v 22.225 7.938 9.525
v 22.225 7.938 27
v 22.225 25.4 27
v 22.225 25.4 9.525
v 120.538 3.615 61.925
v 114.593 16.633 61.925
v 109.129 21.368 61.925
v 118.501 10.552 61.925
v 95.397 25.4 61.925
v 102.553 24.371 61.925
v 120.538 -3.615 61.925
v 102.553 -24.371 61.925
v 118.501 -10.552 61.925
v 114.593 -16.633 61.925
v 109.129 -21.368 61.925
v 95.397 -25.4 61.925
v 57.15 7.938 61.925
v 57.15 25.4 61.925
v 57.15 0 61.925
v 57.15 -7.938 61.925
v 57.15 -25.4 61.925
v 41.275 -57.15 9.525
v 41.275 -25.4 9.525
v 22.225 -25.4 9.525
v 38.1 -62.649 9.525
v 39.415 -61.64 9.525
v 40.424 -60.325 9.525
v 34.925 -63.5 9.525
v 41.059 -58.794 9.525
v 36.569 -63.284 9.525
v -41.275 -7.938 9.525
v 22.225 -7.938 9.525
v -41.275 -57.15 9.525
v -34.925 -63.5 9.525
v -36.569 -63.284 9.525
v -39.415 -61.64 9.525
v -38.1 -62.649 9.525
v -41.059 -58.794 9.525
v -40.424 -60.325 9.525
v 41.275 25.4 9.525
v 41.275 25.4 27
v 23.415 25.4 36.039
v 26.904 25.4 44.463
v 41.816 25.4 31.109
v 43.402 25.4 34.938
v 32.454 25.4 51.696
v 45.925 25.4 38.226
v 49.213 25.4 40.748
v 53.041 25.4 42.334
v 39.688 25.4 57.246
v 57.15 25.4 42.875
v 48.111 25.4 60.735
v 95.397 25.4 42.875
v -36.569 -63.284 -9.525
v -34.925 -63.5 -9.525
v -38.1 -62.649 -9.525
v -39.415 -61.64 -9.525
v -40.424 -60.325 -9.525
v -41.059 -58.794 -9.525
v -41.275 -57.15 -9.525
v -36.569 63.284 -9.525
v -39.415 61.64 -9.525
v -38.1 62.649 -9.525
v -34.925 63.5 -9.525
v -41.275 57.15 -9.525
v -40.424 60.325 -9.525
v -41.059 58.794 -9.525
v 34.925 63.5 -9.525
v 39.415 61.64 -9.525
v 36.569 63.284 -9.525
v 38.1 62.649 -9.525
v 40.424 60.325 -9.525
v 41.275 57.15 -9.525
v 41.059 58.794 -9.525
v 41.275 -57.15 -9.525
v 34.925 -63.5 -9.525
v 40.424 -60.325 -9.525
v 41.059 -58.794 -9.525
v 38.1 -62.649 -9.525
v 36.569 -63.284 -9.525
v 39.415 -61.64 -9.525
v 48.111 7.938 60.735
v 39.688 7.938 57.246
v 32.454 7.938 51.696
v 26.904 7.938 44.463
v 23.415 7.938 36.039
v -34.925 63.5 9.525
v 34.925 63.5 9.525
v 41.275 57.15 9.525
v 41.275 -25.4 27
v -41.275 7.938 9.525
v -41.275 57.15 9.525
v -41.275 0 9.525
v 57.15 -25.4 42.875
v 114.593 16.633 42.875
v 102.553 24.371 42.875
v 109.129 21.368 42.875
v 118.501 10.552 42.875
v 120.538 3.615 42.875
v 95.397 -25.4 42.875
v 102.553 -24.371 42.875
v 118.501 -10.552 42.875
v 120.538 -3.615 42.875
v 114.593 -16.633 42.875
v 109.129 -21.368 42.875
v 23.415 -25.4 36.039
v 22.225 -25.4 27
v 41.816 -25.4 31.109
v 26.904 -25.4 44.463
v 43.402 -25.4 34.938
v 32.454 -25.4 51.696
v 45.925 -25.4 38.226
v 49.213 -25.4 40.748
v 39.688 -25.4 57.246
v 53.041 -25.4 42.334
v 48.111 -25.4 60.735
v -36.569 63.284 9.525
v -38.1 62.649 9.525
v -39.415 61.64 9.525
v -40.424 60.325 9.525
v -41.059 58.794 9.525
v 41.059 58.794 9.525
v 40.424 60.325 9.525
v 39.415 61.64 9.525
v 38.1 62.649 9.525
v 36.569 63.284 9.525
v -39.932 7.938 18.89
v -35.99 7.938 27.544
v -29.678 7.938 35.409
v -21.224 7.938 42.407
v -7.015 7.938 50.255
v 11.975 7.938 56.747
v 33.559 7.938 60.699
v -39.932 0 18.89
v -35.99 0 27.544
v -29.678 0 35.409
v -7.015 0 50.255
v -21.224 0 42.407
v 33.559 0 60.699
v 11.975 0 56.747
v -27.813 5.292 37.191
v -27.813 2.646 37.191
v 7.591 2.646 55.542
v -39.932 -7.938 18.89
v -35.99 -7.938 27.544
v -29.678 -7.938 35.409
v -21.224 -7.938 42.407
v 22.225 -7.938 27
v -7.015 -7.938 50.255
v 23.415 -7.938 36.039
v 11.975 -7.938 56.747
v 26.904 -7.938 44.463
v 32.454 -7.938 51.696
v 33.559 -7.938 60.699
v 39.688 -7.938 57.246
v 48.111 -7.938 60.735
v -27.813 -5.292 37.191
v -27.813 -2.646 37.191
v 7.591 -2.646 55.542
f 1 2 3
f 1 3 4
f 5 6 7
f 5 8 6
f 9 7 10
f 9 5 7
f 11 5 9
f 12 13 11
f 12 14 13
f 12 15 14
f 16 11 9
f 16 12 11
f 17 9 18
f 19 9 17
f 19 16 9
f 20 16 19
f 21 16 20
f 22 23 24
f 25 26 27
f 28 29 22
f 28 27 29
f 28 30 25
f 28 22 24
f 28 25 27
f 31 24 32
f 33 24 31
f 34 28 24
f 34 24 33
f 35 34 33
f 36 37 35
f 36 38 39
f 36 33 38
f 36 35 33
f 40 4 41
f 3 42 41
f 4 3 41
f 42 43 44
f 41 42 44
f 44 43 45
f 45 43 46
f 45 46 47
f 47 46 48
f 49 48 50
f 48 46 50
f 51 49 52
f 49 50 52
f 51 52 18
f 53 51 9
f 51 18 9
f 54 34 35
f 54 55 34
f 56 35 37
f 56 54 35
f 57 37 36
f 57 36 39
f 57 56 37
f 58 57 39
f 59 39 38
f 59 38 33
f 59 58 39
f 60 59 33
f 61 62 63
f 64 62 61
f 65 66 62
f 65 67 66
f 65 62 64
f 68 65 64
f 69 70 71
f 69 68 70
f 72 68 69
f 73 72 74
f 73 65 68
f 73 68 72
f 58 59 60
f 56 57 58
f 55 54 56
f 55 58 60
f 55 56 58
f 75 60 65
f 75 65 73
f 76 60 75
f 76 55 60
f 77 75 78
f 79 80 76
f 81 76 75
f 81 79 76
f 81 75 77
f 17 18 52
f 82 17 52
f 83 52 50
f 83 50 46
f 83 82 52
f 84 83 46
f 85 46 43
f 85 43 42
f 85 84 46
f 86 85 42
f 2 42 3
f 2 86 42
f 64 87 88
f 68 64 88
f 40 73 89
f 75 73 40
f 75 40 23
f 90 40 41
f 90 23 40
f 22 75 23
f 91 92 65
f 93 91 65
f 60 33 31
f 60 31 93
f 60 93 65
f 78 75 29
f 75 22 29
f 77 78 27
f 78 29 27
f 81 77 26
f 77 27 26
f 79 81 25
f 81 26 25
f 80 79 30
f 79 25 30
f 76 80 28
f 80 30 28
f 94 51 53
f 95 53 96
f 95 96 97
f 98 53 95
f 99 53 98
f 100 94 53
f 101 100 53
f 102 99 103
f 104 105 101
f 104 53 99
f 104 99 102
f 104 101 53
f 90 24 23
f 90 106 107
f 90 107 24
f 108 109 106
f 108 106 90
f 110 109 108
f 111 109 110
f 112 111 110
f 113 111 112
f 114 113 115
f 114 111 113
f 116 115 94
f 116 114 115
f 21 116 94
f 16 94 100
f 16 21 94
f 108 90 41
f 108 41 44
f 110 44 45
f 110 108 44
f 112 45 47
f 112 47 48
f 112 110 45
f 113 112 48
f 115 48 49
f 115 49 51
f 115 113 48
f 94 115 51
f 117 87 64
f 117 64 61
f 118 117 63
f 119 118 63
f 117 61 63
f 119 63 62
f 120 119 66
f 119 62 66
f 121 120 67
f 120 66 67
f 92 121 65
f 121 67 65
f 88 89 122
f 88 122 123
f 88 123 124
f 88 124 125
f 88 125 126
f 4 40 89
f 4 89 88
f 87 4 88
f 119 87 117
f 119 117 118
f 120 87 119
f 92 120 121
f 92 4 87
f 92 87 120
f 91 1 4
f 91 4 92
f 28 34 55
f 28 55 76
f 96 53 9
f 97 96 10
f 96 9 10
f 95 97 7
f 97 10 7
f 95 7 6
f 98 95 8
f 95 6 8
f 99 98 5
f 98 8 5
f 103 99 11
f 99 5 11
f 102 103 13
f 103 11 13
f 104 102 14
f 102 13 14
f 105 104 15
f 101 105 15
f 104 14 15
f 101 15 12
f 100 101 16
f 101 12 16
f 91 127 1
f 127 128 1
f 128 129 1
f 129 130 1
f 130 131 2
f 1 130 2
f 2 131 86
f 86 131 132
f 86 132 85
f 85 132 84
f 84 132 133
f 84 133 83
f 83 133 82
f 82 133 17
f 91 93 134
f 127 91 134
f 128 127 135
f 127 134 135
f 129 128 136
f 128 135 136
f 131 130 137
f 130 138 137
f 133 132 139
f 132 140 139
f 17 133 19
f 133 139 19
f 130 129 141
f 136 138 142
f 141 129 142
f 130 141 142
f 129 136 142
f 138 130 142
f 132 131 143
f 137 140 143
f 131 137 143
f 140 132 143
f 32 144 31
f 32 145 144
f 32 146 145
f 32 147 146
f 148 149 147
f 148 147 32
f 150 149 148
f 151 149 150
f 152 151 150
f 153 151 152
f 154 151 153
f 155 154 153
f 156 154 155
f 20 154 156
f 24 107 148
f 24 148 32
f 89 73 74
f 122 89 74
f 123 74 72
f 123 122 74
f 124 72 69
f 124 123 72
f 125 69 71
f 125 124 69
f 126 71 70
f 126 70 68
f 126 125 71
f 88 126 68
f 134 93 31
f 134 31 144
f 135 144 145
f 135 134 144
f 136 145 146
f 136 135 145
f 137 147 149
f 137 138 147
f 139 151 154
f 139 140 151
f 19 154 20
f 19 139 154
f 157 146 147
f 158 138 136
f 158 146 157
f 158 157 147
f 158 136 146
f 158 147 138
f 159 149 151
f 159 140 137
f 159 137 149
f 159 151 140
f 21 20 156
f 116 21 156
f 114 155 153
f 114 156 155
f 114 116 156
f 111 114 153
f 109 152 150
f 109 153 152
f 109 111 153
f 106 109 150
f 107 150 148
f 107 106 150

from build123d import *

# Parameters (mm, degrees)
F1_DEPTH = 63.5
F0_W     = 35.0718458849
F0_H     = 19.05
F2_DEPTH = 25.4
F3_DEPTH = 7.9375
F4_W     = 25.4
F4_H     = 19.05
F6_R     = 6.35


with BuildPart() as f1:
    # F0 (on Front) → F1 (new body, symmetric)
    with BuildSketch(Plane.XZ):
        Polygon((41.275, -9.525), (41.275, 9.525), (22.225, 9.525), (-41.275, 9.525), (-41.275, -9.525), align=None)
    extrude(amount=F1_DEPTH, both=True)

    # F0 (on Front) → F2 (join, symmetric)
    with BuildSketch(Plane.XZ):
        with BuildLine():
            Line((22.225, 9.525), (41.275, 9.525))
            Line((41.275, 9.525), (41.275, 27.0002))
            ThreePointArc((41.275, 27.0002), (45.9246798487, 38.2255201513), (57.15, 42.8752))
            Line((57.15, 42.8752), (60.325, 42.8752))
            Line((60.325, 42.8752), (60.325, 61.9252))
            Line((60.325, 61.9252), (57.15, 61.9252))
            ThreePointArc((57.15, 61.9252), (32.4542956671, 51.6959043329), (22.225, 27.0002))
            Line((22.225, 27.0002), (22.225, 9.525))
        make_face()
        with Locations((77.8609229425, 52.4002)):
            Rectangle(F0_W, F0_H)
    extrude(amount=F2_DEPTH, both=True)

    # F0 (on Front) → F3 (join, symmetric)
    with BuildSketch(Plane.XZ):
        with BuildLine():
            Line((-41.275, 9.525), (22.225, 9.525))
            Line((22.225, 9.525), (22.225, 27.0002))
            ThreePointArc((22.225, 27.0002), (32.4542956671, 51.6959043329), (57.15, 61.9252))
            add(Edge.make_bspline(
                [(-41.275, 9.525), (-41.3783525219, 40.9650179304), (3.1078325119, 62.4104812741), (57.15, 61.9252)],
                knots=[0, 0, 0, 0, 111.5045361635, 111.5045361635, 111.5045361635, 111.5045361635], degree=3))
        make_face()
    extrude(amount=F3_DEPTH, both=True)

    # F4 (on face) → F5 (revolve)
    with BuildSketch(Plane.YZ.offset(95.3968458849)):
        with Locations((-12.7, 52.4002)):
            Rectangle(F4_W, F4_H)
    revolve(axis=Axis((95.3968458849, 0, 52.4002), (0, 0, -1)))

    # F6
    f6_edges = [f1.edges().sort_by_distance(p)[0] for p in [
        (41.275, -63.5, 0),
        (41.275, 63.5, 0),
        (-41.275, 63.5, 0),
        (-41.275, -63.5, 0),
    ]]
    fillet(f6_edges, radius=F6_R)


solid = f1.part
